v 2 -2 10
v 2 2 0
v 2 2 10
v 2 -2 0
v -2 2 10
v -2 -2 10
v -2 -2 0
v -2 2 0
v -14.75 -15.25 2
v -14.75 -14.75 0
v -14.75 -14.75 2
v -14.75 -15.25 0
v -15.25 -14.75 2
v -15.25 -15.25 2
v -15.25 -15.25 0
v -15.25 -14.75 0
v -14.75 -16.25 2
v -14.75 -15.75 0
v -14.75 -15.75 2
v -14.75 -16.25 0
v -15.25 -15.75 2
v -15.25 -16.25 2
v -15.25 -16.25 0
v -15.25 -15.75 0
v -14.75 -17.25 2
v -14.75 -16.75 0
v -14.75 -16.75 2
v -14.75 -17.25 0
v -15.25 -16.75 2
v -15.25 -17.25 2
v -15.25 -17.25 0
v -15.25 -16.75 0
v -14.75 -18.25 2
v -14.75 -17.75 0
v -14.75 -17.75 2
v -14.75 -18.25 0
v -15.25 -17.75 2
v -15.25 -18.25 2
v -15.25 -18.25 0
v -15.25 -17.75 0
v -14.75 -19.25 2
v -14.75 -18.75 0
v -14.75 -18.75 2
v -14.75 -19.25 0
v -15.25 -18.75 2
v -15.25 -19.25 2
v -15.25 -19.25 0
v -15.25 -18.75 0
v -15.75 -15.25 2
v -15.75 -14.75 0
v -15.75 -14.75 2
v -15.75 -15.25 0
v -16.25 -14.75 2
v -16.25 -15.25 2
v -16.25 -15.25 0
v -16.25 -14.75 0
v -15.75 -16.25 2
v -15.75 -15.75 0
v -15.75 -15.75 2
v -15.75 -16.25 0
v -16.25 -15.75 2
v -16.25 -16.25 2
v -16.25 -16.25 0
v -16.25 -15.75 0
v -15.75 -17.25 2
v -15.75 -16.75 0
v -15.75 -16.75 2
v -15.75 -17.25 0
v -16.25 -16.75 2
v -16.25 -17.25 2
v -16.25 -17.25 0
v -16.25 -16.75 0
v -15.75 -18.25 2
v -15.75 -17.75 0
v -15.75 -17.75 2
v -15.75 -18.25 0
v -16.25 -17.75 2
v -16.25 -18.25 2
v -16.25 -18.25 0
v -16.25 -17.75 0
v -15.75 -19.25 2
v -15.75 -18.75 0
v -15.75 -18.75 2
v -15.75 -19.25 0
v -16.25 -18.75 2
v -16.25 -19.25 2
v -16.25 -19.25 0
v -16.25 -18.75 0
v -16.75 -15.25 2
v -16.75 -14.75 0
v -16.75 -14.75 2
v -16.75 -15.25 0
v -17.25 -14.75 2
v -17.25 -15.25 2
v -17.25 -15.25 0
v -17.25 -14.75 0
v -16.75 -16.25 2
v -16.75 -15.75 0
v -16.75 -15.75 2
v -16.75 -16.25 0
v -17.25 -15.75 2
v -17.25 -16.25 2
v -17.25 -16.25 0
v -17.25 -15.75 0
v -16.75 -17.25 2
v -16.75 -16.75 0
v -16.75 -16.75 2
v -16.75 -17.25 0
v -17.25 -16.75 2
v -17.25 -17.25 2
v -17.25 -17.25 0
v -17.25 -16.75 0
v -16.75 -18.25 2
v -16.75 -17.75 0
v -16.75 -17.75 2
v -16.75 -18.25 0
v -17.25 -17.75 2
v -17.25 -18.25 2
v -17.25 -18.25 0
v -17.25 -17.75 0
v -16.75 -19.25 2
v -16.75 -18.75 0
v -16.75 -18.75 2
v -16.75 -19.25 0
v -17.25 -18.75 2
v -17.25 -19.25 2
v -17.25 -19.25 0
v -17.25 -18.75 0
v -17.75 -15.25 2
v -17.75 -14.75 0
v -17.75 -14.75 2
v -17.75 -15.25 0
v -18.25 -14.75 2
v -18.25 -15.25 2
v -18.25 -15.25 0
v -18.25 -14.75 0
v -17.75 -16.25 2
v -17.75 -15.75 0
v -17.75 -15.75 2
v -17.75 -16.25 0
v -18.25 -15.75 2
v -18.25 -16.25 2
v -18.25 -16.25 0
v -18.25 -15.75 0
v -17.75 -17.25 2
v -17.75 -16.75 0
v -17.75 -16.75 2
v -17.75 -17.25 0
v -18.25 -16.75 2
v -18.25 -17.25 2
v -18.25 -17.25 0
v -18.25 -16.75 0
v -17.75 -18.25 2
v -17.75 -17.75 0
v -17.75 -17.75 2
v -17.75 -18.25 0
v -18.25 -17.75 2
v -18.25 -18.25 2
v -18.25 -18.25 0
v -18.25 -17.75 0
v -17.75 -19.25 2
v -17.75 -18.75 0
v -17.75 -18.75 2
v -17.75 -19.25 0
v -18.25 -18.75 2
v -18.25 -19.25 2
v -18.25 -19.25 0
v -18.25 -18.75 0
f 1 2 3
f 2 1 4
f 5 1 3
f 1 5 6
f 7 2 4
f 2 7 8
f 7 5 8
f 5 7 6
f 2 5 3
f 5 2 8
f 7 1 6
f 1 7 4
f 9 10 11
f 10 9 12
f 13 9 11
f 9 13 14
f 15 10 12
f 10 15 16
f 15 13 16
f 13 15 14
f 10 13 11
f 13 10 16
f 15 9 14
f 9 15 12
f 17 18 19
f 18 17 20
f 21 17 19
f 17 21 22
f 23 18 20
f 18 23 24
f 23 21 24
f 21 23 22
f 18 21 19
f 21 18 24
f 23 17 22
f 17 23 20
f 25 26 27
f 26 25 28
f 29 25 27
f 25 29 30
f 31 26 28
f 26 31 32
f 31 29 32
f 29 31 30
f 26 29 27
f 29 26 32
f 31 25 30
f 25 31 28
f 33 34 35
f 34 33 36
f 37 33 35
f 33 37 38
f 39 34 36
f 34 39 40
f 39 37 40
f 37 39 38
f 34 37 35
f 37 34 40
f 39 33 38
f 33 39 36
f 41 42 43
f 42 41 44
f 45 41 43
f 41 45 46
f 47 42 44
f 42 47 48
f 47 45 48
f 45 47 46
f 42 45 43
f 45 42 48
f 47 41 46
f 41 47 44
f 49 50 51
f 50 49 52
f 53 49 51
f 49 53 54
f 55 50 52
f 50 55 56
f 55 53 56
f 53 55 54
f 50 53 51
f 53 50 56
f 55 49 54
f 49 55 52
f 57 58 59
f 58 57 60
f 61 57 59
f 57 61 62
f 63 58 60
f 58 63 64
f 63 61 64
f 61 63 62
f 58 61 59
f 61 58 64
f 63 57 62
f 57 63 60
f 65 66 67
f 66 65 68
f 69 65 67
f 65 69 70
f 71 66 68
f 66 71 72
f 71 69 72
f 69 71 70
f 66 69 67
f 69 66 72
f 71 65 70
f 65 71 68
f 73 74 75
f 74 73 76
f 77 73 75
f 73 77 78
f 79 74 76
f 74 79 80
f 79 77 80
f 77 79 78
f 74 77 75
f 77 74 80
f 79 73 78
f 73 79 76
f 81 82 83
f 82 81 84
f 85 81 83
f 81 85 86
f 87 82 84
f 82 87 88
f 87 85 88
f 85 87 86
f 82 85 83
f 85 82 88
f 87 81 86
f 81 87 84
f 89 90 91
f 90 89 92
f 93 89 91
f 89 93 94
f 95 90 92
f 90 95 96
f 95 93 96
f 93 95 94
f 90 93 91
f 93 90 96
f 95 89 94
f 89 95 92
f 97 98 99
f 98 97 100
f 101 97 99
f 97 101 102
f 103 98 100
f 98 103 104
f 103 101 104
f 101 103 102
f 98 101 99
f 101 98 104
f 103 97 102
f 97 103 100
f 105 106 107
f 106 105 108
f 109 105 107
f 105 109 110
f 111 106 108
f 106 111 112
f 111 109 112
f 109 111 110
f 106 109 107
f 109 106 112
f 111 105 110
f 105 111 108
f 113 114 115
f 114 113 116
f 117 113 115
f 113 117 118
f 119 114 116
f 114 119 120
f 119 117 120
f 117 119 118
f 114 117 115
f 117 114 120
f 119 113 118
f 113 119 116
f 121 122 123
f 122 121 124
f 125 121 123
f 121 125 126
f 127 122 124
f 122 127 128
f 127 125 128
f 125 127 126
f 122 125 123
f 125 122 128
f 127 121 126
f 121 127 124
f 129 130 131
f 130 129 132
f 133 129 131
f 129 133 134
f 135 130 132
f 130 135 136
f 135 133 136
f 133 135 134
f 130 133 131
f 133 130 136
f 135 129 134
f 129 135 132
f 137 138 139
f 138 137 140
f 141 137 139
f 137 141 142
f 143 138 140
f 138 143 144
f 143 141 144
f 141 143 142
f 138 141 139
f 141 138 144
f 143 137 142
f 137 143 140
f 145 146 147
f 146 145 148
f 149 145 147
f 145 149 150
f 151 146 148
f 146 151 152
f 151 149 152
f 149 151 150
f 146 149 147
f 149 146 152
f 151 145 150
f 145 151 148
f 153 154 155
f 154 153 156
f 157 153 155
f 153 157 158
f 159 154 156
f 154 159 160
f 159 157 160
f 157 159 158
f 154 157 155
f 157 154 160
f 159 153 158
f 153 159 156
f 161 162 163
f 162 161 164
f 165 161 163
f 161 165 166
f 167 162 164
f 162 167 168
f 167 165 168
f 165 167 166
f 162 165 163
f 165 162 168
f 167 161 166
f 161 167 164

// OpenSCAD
translate([0, 0, 5]) color([0,1,0,0.9]) cube([4, 4, 10], center=true);
translate([-15.0, -15.0, 1]) color([1,0,0]) cube([0.5, 0.5, 2], center=true);
translate([-15.0, -16.0, 1]) color([1,0,0]) cube([0.5, 0.5, 2], center=true);
translate([-15.0, -17.0, 1]) color([1,0,0]) cube([0.5, 0.5, 2], center=true);
translate([-15.0, -18.0, 1]) color([1,0,0]) cube([0.5, 0.5, 2], center=true);
translate([-15.0, -19.0, 1]) color([1,0,0]) cube([0.5, 0.5, 2], center=true);
translate([-16.0, -15.0, 1]) color([1,0,0]) cube([0.5, 0.5, 2], center=true);
translate([-16.0, -16.0, 1]) color([1,0,0]) cube([0.5, 0.5, 2], center=true);
translate([-16.0, -17.0, 1]) color([1,0,0]) cube([0.5, 0.5, 2], center=true);
translate([-16.0, -18.0, 1]) color([1,0,0]) cube([0.5, 0.5, 2], center=true);
translate([-16.0, -19.0, 1]) color([1,0,0]) cube([0.5, 0.5, 2], center=true);
translate([-17.0, -15.0, 1]) color([1,0,0]) cube([0.5, 0.5, 2], center=true);
translate([-17.0, -16.0, 1]) color([1,0,0]) cube([0.5, 0.5, 2], center=true);
translate([-17.0, -17.0, 1]) color([1,0,0]) cube([0.5, 0.5, 2], center=true);
translate([-17.0, -18.0, 1]) color([1,0,0]) cube([0.5, 0.5, 2], center=true);
translate([-17.0, -19.0, 1]) color([1,0,0]) cube([0.5, 0.5, 2], center=true);
translate([-18.0, -15.0, 1]) color([1,0,0]) cube([0.5, 0.5, 2], center=true);
translate([-18.0, -16.0, 1]) color([1,0,0]) cube([0.5, 0.5, 2], center=true);
translate([-18.0, -17.0, 1]) color([1,0,0]) cube([0.5, 0.5, 2], center=true);
translate([-18.0, -18.0, 1]) color([1,0,0]) cube([0.5, 0.5, 2], center=true);
translate([-18.0, -19.0, 1]) color([1,0,0]) cube([0.5, 0.5, 2], center=true);
